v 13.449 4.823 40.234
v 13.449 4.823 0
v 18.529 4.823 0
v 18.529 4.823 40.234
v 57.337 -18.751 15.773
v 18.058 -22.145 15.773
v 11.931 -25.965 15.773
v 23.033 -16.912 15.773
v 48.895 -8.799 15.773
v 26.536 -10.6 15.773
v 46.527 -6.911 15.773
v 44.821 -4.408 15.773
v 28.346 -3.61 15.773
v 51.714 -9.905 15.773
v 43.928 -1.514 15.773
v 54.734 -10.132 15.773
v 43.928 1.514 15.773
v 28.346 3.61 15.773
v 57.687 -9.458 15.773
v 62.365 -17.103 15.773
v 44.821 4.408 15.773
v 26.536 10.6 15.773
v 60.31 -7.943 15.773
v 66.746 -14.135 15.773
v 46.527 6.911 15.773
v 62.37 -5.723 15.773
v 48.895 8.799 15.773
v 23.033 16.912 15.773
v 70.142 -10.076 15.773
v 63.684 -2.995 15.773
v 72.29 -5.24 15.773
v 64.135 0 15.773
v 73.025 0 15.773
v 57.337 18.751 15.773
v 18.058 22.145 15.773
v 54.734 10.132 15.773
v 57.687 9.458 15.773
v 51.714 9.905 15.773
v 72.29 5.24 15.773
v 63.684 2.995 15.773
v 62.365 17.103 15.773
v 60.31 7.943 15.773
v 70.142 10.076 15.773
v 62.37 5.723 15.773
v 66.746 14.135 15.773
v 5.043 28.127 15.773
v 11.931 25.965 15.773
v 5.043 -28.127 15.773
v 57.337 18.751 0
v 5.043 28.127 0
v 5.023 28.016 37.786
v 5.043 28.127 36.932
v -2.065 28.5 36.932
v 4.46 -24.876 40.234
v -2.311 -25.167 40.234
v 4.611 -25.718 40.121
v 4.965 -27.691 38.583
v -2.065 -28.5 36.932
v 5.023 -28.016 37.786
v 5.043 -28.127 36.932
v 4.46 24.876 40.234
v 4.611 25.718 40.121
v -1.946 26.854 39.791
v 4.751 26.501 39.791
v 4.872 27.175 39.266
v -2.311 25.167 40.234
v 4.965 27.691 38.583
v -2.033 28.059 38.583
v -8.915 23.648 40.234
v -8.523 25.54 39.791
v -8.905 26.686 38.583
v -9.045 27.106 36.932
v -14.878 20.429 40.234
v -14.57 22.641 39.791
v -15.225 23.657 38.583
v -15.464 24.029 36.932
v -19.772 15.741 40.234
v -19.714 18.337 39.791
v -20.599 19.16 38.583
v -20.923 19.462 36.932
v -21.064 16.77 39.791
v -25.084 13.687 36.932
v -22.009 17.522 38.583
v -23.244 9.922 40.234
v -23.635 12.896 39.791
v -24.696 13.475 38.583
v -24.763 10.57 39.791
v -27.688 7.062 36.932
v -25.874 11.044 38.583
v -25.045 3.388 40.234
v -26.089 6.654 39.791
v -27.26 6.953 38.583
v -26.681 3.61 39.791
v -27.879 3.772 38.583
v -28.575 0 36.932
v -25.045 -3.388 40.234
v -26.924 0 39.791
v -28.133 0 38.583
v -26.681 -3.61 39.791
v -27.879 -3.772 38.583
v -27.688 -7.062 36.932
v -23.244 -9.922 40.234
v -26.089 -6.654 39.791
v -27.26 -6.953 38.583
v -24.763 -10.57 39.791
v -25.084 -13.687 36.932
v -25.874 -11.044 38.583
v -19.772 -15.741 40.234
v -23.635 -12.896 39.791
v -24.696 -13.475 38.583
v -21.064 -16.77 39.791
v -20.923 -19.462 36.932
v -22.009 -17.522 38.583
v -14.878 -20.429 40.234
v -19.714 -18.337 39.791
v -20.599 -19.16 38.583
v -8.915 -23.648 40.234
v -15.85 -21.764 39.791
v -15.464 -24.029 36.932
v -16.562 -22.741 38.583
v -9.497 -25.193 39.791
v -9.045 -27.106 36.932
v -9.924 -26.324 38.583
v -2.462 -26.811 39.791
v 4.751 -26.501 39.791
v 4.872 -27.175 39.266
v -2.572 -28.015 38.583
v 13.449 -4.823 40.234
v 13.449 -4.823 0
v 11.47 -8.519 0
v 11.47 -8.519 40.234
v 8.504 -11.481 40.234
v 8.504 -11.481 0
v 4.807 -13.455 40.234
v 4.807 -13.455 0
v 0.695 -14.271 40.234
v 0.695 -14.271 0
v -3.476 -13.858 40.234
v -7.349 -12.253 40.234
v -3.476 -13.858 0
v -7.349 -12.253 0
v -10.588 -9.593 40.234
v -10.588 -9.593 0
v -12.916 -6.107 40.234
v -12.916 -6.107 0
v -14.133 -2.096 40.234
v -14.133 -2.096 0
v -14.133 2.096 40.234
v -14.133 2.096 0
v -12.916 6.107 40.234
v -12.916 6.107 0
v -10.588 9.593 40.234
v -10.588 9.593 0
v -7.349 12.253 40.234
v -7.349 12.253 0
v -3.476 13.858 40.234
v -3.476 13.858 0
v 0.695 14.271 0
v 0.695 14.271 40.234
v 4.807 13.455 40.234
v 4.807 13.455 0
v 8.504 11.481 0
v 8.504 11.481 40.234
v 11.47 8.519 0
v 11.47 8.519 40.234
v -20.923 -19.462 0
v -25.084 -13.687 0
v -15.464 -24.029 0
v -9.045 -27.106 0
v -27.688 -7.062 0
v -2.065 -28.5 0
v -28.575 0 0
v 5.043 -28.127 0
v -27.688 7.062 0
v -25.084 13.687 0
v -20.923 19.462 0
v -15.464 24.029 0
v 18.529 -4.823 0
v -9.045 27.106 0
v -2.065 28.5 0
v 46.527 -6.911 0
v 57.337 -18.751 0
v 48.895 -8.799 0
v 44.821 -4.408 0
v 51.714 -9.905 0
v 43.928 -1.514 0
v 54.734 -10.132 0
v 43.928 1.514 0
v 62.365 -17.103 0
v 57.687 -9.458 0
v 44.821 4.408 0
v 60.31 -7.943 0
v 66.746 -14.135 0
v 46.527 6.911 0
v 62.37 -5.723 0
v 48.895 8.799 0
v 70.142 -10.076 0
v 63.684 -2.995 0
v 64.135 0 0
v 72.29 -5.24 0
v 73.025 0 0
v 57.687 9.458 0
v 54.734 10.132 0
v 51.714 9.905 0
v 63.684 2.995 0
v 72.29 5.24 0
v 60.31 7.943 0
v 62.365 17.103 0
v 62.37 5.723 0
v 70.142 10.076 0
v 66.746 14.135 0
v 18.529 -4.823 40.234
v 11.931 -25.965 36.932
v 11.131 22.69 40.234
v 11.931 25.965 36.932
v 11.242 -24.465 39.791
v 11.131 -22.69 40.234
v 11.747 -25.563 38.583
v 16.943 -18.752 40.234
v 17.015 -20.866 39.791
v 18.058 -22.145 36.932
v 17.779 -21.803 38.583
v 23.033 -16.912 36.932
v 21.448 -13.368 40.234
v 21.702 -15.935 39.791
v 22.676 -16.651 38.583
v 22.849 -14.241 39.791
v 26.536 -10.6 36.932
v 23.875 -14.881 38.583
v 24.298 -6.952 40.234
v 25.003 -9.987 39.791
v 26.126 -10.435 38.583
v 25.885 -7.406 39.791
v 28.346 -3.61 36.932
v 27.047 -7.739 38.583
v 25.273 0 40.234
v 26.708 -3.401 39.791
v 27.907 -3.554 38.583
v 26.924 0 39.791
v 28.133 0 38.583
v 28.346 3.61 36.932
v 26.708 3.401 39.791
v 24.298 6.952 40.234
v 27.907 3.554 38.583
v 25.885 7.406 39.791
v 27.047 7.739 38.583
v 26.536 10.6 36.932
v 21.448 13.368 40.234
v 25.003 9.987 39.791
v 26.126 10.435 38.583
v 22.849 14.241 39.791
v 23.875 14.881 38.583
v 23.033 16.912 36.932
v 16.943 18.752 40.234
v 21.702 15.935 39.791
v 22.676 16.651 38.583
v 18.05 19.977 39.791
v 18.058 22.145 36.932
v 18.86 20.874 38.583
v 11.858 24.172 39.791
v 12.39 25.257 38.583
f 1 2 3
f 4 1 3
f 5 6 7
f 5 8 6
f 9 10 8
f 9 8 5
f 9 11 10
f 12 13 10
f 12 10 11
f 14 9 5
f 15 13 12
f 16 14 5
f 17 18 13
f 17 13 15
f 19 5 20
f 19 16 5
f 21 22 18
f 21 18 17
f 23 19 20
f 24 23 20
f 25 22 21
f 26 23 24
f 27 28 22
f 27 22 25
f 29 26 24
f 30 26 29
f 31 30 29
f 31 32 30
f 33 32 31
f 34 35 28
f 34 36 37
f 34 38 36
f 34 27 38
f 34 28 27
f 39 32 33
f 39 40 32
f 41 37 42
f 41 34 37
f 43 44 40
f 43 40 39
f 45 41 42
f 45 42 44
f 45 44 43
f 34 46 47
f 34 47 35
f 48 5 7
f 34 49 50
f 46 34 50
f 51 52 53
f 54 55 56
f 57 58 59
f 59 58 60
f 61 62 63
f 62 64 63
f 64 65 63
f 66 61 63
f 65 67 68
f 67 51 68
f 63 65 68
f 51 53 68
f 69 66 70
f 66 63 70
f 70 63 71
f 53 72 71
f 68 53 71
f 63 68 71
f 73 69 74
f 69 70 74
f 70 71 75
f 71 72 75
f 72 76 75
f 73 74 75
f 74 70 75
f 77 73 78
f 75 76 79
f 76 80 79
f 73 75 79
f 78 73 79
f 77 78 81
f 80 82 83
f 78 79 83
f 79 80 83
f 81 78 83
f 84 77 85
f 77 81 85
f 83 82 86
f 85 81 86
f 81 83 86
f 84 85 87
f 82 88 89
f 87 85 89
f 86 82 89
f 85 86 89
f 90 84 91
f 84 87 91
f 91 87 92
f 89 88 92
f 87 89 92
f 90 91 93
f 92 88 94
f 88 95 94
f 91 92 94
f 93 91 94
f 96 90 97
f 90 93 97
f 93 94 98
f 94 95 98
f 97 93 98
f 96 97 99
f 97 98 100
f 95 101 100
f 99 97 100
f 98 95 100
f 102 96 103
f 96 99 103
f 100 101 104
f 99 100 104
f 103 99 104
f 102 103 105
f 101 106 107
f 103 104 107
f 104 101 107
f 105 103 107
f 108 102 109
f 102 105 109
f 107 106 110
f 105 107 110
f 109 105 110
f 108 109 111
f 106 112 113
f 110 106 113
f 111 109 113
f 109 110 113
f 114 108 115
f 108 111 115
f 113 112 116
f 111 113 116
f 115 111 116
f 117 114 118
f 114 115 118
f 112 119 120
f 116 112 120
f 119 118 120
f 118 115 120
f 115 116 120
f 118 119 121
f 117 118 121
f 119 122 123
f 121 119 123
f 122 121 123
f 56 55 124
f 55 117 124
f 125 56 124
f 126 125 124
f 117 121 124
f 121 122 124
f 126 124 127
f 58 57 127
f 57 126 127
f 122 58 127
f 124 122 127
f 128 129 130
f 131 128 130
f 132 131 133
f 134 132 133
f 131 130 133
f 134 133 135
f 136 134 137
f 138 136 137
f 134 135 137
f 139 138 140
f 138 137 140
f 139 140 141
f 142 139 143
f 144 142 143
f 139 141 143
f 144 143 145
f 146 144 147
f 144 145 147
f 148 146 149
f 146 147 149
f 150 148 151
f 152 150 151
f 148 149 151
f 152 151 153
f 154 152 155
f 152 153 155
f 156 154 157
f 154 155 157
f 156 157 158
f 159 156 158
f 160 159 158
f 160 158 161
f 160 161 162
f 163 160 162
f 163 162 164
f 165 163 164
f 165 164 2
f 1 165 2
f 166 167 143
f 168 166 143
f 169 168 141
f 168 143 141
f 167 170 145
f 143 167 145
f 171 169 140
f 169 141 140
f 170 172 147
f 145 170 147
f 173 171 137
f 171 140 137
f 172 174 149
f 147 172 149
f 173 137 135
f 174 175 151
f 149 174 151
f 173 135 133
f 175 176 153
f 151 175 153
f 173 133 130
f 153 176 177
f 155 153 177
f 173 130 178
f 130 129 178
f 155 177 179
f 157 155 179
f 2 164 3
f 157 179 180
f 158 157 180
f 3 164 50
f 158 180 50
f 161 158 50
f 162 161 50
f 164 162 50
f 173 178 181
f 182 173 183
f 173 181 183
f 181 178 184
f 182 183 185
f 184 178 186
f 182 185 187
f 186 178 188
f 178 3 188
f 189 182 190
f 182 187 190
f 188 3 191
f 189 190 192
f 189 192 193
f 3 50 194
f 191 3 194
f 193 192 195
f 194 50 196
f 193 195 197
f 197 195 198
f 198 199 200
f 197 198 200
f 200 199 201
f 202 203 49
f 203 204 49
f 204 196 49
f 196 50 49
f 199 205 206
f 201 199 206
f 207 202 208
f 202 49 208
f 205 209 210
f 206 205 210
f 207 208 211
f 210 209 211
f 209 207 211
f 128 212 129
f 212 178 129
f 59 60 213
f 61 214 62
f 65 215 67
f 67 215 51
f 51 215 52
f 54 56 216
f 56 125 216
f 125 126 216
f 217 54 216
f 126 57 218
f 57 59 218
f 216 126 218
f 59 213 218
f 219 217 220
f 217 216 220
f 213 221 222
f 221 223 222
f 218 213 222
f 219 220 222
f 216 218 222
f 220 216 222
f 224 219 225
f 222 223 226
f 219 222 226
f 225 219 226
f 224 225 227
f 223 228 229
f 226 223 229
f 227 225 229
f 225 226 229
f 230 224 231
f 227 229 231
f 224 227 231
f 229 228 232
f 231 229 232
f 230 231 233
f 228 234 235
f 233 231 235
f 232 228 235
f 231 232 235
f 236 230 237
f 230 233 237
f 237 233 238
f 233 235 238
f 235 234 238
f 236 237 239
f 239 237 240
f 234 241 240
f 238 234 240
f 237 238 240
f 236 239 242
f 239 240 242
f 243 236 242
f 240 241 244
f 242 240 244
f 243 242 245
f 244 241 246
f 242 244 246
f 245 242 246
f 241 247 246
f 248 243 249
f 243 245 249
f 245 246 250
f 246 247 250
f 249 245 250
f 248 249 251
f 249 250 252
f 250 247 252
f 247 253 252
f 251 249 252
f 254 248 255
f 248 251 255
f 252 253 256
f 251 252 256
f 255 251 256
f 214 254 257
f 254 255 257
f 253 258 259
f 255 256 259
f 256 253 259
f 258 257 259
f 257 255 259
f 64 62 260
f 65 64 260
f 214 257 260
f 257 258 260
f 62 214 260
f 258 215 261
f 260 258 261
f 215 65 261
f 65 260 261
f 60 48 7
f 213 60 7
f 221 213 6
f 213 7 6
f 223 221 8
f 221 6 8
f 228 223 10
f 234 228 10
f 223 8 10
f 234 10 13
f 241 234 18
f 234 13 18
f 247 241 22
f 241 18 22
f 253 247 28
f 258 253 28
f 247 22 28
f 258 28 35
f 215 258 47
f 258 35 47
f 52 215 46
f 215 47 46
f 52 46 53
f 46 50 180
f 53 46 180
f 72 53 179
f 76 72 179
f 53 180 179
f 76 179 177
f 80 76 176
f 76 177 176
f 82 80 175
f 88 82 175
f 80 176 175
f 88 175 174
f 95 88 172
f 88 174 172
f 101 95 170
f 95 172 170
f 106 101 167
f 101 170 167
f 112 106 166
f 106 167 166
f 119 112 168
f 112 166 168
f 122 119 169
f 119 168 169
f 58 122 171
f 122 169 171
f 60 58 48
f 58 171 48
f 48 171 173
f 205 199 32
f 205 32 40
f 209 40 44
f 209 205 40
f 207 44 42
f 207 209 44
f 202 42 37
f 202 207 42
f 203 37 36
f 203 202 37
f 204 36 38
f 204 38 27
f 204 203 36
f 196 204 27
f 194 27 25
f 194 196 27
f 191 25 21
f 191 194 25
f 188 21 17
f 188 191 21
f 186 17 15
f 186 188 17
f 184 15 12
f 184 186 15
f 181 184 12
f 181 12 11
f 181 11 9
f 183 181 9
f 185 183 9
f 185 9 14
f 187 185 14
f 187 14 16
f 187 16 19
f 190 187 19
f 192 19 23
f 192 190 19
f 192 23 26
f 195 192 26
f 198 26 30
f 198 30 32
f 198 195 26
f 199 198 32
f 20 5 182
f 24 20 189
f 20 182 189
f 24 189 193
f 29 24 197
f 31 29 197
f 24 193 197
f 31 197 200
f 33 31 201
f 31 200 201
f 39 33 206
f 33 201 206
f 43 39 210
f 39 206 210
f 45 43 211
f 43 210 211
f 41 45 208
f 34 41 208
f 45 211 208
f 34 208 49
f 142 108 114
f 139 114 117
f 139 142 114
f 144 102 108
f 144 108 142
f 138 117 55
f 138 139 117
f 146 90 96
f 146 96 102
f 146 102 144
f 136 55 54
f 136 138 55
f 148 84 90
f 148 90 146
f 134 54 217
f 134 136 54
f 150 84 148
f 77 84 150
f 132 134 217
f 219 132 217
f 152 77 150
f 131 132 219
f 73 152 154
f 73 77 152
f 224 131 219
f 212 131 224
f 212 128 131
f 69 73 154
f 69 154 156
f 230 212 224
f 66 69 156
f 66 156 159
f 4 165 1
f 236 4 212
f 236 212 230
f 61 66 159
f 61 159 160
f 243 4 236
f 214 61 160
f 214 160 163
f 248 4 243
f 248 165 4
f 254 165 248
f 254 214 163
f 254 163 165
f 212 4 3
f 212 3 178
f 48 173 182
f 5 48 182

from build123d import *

# Parameters (mm, degrees)
F0_R     = 10.16
F1_DEPTH = 15.7734
F3_DEPTH = 24.4602
F4_R     = 3.302


with BuildPart() as f1:
    # F0 (on Top) → F1 (new body)
    with BuildSketch(Plane.XY):
        with BuildLine():
            ThreePointArc((5.0426470588, -28.1265414802), (21.9160245563, -18.3362616868), (28.575, 0))
            ThreePointArc((28.575, 0), (21.9160245563, 18.3362616868), (5.0426470588, 28.1265414802))
            ThreePointArc((5.0426470588, 28.1265414802), (-28.575, 0), (5.0426470588, -28.1265414802))
        make_face()
        with BuildLine():
            ThreePointArc((13.448752708, -4.8232465051), (-14.2875, 0), (13.448752708, 4.8232465051))
            Line((13.448752708, 4.8232465051), (18.5293, 4.8232465051))
            Line((18.5293, 4.8232465051), (18.5293, -4.8232465051))
            Line((18.5293, -4.8232465051), (13.448752708, -4.8232465051))
        make_face(mode=Mode.SUBTRACT)
        with BuildLine():
            ThreePointArc((5.0426470588, 28.1265414802), (21.9160245563, 18.3362616868), (28.575, 0))
            ThreePointArc((28.575, 0), (21.9160245563, -18.3362616868), (5.0426470588, -28.1265414802))
            Line((5.0426470588, -28.1265414802), (57.3367647059, -18.7510276535))
            ThreePointArc((57.3367647059, -18.7510276535), (73.025, 0), (57.3367647059, 18.7510276535))
            Line((57.3367647059, 18.7510276535), (5.0426470588, 28.1265414802))
        make_face()
        with Locations((53.975, 0)):
            Circle(F0_R, mode=Mode.SUBTRACT)
    extrude(amount=F1_DEPTH)

    # F2 (on face) → F3 (join)
    with BuildSketch(Plane.XY.offset(15.7734)):
        with BuildLine():
            ThreePointArc((5.0426470588, -28.1265414802), (21.9160245563, -18.3362616868), (28.575, 0))
            ThreePointArc((28.575, 0), (21.9160245563, 18.3362616868), (5.0426470588, 28.1265414802))
            ThreePointArc((5.0426470588, 28.1265414802), (-28.575, 0), (5.0426470588, -28.1265414802))
        make_face()
        with BuildLine():
            Line((18.5293, -4.8232465051), (13.448752708, -4.8232465051))
            ThreePointArc((13.448752708, -4.8232465051), (-14.2875, 0), (13.448752708, 4.8232465051))
            Line((13.448752708, 4.8232465051), (18.5293, 4.8232465051))
            Line((18.5293, 4.8232465051), (18.5293, -4.8232465051))
        make_face(mode=Mode.SUBTRACT)
    extrude(amount=F3_DEPTH)

    # F4
    f4_edges = [f1.edges().sort_by_distance(p)[0] for p in [
        (-5.042647, 28.126541, 40.2336),
    ]]
    fillet(f4_edges, radius=F4_R)


solid = f1.part
